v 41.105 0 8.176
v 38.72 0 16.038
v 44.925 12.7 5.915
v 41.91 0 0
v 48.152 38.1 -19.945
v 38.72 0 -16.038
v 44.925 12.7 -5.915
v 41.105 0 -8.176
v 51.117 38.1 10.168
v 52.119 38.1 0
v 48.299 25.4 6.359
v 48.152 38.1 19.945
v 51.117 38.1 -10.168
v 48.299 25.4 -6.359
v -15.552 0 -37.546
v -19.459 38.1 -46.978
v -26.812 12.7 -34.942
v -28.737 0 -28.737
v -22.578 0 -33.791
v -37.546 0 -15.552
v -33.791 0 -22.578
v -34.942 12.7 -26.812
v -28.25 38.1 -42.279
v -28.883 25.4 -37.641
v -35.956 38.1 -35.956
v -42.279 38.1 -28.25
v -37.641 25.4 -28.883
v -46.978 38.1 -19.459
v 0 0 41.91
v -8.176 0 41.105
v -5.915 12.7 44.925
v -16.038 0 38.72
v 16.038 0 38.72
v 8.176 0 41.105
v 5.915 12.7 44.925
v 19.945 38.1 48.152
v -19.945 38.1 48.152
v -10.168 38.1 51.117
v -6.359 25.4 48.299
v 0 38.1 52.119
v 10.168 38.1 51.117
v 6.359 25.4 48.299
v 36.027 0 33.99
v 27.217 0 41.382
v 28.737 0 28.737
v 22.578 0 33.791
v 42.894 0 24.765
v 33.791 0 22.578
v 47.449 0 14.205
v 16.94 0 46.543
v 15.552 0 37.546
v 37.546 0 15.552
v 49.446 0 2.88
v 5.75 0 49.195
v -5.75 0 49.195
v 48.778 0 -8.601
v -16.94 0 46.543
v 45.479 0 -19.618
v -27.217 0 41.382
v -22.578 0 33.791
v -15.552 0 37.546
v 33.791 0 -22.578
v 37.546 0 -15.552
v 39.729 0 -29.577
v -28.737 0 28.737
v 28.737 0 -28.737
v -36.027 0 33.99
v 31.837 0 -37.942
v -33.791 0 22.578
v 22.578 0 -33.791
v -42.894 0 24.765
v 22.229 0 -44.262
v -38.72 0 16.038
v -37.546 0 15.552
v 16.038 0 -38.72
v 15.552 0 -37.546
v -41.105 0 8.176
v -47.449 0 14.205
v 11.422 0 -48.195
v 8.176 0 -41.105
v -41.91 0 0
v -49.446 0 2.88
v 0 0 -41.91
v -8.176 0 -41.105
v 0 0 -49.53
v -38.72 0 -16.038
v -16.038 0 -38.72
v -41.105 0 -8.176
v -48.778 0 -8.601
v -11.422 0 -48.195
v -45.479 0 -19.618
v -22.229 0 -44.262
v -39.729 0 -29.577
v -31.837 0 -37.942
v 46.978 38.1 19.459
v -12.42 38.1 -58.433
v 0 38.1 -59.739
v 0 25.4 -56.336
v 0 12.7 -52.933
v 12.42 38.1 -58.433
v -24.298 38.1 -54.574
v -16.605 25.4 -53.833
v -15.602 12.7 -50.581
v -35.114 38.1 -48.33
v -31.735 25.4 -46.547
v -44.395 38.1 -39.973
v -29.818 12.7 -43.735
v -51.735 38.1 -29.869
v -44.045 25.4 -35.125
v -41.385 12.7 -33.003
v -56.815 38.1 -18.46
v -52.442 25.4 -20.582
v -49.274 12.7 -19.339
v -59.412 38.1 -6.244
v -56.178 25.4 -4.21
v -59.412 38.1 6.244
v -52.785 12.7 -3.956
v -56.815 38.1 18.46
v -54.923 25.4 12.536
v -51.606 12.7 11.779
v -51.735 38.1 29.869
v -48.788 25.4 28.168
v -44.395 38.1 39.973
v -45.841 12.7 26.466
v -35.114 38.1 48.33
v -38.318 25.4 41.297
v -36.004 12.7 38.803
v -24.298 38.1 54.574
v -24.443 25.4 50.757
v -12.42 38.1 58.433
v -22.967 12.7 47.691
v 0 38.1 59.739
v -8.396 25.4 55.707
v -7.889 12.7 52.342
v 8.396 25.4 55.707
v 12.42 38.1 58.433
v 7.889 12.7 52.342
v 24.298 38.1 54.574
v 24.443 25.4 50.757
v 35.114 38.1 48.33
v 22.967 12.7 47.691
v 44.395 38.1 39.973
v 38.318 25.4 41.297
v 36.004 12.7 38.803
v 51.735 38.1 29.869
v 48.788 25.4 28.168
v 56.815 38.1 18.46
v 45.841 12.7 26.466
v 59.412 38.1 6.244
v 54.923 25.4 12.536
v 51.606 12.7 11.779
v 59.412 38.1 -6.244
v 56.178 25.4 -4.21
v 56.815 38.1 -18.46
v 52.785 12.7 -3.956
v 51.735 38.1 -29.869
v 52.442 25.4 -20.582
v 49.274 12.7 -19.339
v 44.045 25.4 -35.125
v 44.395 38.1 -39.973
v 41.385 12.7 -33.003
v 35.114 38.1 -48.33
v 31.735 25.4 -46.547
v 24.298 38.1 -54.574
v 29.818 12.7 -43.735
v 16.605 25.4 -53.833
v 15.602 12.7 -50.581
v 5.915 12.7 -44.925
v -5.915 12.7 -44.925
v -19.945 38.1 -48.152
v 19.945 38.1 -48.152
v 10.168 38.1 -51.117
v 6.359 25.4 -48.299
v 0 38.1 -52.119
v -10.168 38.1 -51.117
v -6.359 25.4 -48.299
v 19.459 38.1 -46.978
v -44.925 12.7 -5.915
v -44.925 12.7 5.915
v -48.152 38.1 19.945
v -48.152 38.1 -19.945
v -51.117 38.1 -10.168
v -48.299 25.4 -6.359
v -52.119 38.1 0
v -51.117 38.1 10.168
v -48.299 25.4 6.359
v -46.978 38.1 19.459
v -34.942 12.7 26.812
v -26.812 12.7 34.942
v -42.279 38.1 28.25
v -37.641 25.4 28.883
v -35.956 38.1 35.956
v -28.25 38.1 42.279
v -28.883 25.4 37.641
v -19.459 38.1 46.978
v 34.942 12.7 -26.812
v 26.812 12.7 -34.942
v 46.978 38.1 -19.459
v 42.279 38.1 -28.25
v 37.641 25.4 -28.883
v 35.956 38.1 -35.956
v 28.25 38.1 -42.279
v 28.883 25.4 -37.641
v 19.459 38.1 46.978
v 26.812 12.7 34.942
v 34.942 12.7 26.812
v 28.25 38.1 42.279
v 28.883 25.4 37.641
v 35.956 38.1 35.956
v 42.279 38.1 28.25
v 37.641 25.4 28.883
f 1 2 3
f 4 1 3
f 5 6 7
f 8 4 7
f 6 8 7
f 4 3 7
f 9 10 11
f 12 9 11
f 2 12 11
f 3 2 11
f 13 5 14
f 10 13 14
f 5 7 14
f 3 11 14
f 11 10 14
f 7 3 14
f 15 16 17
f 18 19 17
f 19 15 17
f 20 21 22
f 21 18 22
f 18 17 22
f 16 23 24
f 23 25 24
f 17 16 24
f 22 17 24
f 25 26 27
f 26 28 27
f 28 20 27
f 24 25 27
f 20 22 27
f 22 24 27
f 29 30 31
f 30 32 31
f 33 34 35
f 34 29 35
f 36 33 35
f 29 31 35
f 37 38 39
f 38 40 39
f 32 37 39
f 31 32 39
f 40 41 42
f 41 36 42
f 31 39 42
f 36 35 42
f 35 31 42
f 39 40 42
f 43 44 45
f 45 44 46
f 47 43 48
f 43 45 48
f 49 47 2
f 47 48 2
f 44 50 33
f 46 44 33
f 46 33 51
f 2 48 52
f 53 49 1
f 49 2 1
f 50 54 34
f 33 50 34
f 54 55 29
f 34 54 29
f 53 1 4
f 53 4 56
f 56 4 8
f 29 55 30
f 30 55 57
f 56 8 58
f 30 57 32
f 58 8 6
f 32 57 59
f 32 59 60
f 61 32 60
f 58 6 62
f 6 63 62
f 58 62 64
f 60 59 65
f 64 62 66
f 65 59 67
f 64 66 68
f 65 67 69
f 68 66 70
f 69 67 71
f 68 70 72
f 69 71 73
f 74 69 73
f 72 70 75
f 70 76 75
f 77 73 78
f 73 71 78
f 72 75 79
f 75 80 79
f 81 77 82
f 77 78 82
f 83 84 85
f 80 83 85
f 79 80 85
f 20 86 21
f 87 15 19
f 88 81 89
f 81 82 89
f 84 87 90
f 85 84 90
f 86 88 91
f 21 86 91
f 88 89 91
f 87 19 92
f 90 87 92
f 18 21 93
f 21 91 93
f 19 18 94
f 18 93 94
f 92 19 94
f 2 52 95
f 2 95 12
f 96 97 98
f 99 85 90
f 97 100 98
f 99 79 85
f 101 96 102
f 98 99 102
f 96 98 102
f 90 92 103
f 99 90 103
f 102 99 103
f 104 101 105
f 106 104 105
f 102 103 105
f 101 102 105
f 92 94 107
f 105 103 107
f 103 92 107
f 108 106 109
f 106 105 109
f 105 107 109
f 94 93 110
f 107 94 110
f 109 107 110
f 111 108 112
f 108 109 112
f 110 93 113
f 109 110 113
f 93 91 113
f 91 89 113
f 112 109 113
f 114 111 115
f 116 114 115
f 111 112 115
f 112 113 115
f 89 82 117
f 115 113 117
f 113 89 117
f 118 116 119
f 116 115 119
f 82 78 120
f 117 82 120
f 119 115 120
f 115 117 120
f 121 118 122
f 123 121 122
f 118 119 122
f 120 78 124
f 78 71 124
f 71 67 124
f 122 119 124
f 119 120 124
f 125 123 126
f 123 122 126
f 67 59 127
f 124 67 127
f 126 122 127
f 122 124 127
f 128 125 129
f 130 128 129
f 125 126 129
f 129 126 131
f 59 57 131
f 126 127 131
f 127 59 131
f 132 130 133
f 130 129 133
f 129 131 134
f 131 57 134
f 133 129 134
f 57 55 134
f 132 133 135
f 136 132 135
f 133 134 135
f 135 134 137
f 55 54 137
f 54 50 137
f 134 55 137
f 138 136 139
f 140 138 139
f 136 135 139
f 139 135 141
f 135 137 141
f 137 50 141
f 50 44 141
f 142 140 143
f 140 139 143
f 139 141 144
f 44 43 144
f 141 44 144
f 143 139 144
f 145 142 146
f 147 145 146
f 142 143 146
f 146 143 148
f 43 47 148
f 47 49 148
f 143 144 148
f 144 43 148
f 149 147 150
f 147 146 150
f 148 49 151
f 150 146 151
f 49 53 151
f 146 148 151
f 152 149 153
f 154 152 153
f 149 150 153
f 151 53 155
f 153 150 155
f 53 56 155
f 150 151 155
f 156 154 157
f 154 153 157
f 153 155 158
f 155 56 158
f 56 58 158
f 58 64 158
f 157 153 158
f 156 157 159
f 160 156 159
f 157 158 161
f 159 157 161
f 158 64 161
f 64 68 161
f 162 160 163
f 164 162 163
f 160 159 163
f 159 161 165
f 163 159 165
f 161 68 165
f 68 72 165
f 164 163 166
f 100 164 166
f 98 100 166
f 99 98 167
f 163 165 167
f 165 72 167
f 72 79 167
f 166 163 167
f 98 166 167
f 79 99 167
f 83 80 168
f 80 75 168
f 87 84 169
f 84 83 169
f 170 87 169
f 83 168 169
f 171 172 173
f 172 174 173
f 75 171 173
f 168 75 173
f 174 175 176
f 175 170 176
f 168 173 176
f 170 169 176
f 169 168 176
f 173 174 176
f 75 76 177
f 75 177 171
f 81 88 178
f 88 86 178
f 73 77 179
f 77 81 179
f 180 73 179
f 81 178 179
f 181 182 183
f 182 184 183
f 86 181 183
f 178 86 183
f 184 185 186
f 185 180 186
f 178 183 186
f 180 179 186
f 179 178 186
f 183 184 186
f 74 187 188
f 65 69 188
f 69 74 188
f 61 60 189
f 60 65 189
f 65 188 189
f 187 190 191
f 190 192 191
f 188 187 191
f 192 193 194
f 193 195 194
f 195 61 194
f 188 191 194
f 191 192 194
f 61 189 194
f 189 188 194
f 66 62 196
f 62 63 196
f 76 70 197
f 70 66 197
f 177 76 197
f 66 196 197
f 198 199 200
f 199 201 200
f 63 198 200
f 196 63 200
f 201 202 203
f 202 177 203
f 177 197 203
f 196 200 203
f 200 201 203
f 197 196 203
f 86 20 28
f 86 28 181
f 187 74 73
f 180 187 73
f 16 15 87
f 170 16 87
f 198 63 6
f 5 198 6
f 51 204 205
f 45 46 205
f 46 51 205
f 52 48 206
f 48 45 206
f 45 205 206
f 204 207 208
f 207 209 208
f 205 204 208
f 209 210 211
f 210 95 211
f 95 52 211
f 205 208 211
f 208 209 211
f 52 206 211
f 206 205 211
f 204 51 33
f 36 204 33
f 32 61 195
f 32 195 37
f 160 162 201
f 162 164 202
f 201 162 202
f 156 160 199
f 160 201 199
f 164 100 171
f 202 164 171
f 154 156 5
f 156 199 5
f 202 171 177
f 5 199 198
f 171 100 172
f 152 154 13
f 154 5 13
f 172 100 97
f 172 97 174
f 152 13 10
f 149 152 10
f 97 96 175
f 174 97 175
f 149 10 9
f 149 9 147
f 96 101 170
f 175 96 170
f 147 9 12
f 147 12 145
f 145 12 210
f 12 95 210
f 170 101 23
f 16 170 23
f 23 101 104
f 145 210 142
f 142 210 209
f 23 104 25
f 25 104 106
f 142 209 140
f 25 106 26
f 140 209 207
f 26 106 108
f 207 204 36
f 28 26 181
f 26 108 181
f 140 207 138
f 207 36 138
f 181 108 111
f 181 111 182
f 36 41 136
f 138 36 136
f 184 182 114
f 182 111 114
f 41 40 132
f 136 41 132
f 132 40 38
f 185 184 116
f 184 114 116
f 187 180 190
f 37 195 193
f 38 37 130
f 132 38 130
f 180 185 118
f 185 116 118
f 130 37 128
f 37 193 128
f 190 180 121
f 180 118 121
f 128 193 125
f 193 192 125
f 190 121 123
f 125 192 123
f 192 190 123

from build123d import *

# Parameters (mm, degrees)
CUT_REVOLVE1_ANGLE = 45
CIRPATTERN1_COUNT  = 4


with BuildPart() as part:
    # Sketch1 → Revolve1 (revolve)
    with BuildSketch(Plane.XY, mode=Mode.PRIVATE) as revolve1_sk:
        Polygon((40.64, 0), (50.848864232, 38.1), (59.738864232, 38.1), (49.53, 0), align=None)
    revolve(revolve1_sk.sketch.rotate(Axis((0, 0, 0), (0, 1, 0)), 90), axis=Axis((0, 0, 0), (0, 1, 0)))

    # Sketch2 → Cut-Revolve1 (revolve, symmetric, cut)
    with BuildSketch(Plane.XY) as cut_revolve1_sk:
        Polygon((50.848864232, 38.1), (40.64, 0), (41.91, 0), (52.118864232, 38.1), align=None)
    cut_revolve1 = revolve(axis=Axis((0, 0, 0), (0, 1, 0)), revolution_arc=CUT_REVOLVE1_ANGLE / 2, mode=Mode.SUBTRACT)
    cut_revolve1 = cut_revolve1 + revolve(cut_revolve1_sk.sketch, axis=Axis((0, 0, 0), (0, -1, 0)), revolution_arc=CUT_REVOLVE1_ANGLE / 2, mode=Mode.SUBTRACT)

    # CirPattern1: Cut-Revolve1 ×4 about axis
    cirpattern1_axis = Axis((0, 38.1, 0), (0, -1, 0))
    for i in range(1, CIRPATTERN1_COUNT):
        add(cut_revolve1.rotate(cirpattern1_axis, i * 360 / CIRPATTERN1_COUNT), mode=Mode.SUBTRACT)


solid = part.part
